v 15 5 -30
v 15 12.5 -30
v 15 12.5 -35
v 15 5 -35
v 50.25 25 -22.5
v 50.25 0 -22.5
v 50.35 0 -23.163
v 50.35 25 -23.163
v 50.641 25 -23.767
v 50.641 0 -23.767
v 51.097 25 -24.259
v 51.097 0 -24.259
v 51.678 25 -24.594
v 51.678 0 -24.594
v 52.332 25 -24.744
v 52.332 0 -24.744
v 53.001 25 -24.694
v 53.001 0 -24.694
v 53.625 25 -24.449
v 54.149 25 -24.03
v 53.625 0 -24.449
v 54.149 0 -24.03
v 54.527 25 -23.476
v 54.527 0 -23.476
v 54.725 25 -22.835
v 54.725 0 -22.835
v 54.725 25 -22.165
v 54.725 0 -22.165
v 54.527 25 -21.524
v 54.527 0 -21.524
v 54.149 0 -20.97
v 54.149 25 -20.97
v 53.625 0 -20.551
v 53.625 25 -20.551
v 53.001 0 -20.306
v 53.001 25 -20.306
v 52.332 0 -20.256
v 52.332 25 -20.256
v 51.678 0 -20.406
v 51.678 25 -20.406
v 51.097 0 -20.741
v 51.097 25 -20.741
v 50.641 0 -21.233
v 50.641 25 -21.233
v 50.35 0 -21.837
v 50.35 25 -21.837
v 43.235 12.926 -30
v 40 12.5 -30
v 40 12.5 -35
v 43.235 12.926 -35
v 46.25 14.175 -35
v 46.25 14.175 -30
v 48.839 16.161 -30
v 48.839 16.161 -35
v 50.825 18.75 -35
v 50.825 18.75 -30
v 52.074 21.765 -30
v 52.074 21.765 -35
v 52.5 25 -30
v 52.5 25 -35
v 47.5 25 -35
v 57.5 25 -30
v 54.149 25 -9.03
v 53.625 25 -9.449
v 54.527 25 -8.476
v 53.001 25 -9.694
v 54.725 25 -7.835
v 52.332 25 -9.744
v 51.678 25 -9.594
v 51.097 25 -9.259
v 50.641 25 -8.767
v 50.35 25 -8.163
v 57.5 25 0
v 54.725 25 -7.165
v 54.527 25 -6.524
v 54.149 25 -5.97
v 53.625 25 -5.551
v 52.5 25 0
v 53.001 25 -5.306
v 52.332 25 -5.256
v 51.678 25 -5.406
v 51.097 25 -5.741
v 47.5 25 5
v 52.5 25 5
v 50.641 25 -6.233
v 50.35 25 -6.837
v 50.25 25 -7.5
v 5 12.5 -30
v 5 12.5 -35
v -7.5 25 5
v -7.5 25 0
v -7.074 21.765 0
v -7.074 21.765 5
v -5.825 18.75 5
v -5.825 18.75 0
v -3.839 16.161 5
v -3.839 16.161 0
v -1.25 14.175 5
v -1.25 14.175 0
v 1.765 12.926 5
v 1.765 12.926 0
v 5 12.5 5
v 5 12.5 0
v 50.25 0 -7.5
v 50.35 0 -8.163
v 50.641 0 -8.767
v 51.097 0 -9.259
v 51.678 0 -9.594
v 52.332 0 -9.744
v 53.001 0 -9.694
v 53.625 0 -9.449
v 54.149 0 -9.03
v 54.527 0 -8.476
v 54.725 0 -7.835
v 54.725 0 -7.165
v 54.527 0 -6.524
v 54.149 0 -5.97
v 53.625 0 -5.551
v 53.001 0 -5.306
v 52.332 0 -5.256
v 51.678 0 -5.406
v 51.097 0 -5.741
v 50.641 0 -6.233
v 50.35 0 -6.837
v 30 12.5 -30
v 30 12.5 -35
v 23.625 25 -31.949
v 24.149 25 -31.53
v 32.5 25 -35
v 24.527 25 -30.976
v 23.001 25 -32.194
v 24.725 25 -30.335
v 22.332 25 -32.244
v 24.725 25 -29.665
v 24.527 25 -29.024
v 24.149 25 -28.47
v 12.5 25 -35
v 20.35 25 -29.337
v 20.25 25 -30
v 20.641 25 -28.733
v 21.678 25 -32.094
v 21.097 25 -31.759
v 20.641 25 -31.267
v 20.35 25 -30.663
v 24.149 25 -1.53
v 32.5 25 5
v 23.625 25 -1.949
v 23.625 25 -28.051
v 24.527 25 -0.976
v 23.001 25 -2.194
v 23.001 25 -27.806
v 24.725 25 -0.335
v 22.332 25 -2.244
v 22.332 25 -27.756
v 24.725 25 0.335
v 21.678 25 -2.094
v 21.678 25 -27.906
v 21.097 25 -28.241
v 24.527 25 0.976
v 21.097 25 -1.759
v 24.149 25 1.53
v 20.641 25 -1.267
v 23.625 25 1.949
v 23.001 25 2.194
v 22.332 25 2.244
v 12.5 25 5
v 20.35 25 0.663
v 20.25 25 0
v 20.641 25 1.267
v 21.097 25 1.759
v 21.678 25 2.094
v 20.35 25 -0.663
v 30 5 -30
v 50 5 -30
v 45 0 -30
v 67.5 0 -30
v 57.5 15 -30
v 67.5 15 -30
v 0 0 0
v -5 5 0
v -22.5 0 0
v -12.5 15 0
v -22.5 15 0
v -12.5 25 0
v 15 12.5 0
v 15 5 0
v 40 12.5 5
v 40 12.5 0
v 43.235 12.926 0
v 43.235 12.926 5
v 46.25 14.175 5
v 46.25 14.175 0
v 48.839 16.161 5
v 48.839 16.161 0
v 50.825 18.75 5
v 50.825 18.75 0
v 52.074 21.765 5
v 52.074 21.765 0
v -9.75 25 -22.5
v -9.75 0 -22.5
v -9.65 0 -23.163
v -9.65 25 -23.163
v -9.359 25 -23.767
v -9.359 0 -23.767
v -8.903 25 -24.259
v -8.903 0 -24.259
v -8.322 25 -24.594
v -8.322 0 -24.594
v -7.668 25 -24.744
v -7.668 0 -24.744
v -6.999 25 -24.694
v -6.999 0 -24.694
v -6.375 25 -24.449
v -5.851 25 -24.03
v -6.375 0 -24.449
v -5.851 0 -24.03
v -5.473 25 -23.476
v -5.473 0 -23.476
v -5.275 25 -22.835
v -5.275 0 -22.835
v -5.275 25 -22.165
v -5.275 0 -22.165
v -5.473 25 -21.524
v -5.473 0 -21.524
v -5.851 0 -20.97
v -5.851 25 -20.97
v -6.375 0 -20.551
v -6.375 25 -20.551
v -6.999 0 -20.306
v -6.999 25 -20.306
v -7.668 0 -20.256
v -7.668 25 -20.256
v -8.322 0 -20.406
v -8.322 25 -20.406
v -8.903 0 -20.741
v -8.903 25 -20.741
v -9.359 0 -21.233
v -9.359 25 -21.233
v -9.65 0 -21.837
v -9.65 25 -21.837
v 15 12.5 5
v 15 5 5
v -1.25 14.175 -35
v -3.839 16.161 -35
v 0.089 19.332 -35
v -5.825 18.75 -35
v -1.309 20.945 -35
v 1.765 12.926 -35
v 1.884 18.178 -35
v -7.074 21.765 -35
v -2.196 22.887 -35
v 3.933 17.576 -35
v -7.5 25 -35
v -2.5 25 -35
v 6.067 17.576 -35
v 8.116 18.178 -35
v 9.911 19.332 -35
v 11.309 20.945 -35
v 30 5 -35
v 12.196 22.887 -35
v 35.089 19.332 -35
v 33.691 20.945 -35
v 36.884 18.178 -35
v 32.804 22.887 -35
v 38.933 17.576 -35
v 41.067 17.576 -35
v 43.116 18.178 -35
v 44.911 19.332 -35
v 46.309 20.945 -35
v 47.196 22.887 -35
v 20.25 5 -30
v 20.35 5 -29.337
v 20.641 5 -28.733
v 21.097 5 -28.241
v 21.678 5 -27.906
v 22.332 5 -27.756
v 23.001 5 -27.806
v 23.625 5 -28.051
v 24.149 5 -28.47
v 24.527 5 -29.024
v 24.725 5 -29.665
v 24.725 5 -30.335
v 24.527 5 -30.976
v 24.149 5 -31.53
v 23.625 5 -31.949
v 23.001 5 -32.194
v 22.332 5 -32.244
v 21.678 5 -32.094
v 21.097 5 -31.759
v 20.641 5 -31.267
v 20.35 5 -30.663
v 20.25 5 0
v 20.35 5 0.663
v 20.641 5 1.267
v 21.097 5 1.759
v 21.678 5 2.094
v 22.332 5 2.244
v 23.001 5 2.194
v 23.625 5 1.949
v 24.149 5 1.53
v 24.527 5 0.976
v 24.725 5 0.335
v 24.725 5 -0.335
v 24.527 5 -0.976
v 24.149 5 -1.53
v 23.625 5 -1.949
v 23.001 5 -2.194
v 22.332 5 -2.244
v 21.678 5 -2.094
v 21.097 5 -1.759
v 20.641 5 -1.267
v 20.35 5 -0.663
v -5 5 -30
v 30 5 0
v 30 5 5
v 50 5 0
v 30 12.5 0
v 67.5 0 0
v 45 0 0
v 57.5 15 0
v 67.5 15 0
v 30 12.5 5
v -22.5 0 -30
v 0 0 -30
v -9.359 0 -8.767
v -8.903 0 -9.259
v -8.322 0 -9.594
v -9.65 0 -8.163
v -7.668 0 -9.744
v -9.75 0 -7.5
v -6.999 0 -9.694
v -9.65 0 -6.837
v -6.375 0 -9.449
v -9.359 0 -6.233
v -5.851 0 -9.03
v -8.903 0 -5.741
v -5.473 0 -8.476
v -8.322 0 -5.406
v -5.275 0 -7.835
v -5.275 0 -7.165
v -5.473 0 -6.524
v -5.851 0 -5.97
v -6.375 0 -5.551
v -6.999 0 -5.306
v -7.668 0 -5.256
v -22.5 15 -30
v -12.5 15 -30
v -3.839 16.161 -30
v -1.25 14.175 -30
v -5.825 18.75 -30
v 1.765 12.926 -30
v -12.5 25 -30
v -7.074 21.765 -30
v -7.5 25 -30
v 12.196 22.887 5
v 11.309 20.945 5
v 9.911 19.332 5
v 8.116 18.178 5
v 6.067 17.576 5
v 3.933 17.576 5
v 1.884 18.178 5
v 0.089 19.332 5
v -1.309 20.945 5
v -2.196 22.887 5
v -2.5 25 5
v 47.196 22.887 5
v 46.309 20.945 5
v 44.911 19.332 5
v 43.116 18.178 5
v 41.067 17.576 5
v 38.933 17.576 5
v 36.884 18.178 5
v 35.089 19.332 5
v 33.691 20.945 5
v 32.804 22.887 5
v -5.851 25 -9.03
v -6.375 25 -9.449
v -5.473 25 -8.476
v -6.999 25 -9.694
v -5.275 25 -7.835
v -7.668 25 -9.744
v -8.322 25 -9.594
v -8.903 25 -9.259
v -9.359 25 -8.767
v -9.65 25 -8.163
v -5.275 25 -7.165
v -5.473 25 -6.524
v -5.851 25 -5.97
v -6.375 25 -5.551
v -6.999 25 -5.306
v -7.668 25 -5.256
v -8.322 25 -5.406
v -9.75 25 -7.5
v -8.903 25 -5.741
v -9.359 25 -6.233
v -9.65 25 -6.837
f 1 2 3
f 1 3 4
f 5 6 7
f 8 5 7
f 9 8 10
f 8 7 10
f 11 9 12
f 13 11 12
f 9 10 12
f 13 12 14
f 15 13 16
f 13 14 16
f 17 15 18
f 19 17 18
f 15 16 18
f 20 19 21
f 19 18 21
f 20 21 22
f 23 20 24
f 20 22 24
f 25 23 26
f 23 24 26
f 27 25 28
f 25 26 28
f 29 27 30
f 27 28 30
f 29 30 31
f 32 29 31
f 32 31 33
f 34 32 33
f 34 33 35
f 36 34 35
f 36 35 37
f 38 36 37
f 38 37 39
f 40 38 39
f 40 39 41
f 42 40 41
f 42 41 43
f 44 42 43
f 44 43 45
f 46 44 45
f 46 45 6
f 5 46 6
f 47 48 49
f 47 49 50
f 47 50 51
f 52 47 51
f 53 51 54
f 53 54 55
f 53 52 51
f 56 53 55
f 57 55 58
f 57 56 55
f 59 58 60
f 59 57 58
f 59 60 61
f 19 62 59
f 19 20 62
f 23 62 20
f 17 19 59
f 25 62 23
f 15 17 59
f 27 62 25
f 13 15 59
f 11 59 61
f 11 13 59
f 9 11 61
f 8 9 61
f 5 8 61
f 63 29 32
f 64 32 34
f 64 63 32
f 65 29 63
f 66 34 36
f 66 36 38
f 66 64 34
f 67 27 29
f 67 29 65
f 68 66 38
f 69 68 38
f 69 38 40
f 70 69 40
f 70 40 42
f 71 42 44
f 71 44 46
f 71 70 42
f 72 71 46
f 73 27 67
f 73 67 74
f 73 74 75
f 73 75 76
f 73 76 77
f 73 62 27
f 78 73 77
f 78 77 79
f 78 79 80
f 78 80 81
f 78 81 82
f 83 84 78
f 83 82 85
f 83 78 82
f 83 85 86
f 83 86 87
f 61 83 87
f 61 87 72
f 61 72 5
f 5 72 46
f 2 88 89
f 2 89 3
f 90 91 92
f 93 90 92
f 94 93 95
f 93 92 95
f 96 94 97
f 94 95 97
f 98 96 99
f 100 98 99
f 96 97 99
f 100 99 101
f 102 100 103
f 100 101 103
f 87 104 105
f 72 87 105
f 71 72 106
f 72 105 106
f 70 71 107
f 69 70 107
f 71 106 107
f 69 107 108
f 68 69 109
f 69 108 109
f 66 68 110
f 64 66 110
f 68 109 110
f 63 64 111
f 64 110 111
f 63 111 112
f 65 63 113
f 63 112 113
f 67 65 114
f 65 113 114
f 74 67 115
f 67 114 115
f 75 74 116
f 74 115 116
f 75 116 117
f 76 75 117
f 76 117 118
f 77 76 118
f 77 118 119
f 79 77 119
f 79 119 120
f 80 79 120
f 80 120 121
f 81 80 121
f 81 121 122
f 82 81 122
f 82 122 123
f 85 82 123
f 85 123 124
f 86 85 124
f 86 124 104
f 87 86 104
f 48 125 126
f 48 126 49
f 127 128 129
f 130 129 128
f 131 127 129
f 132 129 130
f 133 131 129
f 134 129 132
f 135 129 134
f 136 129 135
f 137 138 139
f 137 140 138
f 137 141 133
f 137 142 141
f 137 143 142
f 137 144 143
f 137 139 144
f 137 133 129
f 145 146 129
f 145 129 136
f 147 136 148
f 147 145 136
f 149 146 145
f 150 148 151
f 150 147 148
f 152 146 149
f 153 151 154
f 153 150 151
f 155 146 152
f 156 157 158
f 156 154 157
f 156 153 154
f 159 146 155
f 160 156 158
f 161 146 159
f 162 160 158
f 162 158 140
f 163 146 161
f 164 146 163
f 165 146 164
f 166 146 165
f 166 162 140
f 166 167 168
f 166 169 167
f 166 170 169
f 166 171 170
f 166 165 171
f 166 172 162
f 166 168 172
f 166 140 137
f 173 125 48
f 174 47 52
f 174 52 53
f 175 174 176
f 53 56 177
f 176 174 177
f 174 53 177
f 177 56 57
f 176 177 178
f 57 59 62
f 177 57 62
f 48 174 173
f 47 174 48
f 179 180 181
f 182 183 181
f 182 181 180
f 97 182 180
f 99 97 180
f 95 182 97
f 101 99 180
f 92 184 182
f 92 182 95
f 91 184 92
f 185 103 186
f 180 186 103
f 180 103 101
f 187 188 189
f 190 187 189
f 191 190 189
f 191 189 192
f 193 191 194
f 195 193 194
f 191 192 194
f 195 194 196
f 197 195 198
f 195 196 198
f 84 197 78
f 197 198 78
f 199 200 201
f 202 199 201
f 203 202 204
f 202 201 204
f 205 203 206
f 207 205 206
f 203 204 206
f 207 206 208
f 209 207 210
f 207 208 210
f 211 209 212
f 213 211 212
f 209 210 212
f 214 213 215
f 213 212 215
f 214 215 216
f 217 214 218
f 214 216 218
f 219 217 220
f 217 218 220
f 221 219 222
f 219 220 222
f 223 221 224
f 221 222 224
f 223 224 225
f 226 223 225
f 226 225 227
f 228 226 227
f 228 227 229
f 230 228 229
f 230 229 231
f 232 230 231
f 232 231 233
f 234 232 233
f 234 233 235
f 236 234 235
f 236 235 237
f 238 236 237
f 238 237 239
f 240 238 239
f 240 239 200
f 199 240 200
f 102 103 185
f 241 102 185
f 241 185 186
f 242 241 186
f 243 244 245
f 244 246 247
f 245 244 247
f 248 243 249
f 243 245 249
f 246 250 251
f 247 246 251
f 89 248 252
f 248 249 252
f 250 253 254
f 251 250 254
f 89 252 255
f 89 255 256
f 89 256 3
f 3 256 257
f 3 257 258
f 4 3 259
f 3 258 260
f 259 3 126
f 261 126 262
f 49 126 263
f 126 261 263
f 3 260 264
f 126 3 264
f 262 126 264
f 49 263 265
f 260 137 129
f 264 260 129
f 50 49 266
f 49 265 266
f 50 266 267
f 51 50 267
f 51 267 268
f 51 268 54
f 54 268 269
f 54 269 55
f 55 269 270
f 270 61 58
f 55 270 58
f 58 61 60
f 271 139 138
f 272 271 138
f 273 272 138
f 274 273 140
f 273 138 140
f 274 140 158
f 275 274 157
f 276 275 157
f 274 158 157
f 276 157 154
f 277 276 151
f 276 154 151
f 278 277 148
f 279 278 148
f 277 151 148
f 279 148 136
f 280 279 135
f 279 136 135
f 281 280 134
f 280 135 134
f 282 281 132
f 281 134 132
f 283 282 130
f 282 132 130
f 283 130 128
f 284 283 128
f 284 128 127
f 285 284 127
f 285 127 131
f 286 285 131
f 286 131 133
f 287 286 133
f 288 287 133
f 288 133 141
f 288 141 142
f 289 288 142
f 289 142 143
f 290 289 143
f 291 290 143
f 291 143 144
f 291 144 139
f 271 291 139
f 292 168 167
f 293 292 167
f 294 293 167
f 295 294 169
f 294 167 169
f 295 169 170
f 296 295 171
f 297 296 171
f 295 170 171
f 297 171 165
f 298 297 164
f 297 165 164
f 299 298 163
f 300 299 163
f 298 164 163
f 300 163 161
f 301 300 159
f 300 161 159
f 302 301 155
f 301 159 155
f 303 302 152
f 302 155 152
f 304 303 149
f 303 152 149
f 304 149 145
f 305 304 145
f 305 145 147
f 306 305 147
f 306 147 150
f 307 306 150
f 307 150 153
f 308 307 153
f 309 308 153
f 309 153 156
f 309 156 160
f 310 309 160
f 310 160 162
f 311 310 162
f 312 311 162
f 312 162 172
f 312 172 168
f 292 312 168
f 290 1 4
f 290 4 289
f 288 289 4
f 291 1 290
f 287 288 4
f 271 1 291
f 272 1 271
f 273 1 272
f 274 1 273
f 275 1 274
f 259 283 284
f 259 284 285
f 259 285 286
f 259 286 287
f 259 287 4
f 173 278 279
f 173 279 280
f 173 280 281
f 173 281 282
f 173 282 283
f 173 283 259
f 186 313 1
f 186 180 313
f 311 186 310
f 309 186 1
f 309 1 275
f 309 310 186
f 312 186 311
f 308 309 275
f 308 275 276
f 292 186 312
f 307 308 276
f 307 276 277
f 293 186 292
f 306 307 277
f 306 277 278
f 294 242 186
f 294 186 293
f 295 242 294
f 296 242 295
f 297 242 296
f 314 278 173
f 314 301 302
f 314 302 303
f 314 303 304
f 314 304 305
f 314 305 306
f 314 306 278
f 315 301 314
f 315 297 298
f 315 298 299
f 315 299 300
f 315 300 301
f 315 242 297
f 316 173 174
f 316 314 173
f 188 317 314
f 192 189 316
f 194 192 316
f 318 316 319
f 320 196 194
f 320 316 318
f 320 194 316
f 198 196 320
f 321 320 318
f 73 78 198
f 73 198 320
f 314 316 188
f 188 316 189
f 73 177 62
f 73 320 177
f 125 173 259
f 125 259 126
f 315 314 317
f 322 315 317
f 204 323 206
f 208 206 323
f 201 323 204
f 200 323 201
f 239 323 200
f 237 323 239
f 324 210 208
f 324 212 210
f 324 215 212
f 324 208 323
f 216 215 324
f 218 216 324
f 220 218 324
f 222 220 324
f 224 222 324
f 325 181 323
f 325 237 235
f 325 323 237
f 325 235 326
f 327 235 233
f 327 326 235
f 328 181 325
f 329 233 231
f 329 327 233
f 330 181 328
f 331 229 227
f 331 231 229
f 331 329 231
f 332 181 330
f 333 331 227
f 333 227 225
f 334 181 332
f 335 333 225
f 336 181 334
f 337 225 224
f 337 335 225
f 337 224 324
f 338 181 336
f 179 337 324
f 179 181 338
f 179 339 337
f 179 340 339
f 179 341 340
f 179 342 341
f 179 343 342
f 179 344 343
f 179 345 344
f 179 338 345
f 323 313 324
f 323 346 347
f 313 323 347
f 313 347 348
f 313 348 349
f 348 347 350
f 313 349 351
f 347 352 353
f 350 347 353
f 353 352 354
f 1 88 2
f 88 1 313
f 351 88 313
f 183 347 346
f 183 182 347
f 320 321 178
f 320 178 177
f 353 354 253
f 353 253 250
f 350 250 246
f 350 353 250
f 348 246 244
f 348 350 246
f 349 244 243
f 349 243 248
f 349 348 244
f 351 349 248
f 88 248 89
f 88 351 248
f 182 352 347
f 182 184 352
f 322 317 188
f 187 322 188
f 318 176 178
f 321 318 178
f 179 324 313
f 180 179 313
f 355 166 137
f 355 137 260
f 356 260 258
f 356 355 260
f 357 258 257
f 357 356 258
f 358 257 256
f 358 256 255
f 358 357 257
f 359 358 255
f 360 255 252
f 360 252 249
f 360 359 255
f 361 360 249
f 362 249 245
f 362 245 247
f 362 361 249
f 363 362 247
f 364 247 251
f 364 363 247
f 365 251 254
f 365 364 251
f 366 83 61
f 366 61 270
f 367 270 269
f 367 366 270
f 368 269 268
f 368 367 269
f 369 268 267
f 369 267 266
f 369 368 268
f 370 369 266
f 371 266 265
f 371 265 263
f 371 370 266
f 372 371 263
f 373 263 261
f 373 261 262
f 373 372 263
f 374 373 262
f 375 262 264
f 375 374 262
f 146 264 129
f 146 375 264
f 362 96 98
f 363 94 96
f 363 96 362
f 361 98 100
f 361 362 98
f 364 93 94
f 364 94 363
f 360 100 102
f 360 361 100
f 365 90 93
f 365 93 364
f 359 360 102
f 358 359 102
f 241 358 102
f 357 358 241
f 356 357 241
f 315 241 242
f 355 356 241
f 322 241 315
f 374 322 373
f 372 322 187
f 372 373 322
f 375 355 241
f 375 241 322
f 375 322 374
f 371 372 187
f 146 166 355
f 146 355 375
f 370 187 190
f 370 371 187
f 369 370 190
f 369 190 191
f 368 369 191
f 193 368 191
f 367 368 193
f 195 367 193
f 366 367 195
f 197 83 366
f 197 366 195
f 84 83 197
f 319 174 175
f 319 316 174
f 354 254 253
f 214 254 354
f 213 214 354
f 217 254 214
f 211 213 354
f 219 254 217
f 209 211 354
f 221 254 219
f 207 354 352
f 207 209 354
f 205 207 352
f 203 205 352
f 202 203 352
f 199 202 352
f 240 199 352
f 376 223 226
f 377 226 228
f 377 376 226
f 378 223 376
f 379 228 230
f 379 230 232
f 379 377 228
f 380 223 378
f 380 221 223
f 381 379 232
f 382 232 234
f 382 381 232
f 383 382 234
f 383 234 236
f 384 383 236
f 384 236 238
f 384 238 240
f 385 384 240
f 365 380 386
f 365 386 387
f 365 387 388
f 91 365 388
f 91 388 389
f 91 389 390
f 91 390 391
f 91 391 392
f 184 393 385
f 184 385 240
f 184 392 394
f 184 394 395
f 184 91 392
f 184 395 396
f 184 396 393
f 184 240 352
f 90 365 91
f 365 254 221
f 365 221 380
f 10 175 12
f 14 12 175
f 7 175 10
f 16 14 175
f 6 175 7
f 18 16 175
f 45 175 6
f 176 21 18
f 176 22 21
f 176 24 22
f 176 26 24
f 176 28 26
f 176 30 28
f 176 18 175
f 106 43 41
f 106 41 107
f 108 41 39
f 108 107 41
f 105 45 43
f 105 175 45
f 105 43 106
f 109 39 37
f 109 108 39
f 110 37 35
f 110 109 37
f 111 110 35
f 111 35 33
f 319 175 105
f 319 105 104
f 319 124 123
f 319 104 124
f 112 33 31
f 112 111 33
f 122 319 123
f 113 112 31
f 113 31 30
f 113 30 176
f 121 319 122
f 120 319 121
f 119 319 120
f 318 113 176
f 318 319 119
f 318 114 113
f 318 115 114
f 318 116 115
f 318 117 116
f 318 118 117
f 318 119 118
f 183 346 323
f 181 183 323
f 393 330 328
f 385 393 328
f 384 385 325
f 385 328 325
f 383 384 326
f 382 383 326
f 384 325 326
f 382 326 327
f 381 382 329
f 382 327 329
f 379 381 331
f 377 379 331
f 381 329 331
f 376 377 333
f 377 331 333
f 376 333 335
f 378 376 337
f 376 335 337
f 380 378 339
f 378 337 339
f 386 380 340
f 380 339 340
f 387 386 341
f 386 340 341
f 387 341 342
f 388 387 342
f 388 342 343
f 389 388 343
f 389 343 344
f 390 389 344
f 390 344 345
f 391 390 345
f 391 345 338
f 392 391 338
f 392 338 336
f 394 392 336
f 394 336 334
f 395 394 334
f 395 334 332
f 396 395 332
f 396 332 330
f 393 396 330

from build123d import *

# Parameters (mm, degrees)
BOSS_EXTRUDE1_DEPTH   = 5
BOSS_EXTRUDE2_START   = -15
BOSS_EXTRUDE2_DEPTH   = 15
F_1_0MM_DOWEL_HOLE1_D = 4.5
SKETCH5_R             = 2.25
CUT_EXTRUDE1_DEPTH    = 81.039052968


with BuildPart() as part:
    # Sketch1 → Boss-Extrude1 (new body)
    with BuildSketch(Plane.XY):
        with BuildLine():
            Line((22.5, 25), (22.5, 5))
            Line((22.5, 5), (30, 5))
            Line((30, 5), (30, 12.5))
            Line((30, 12.5), (40, 12.5))
            ThreePointArc((40, 12.5), (48.838834765, 16.161165235), (52.5, 25))
            Line((52.5, 25), (47.5, 25))
            ThreePointArc((47.5, 25), (40, 17.5), (32.5, 25))
            Line((32.5, 25), (22.5, 25))
        make_face()
        with BuildLine():
            Line((15, 12.5), (15, 5))
            Line((15, 5), (22.5, 5))
            Line((22.5, 5), (22.5, 25))
            Line((22.5, 25), (12.5, 25))
            ThreePointArc((12.5, 25), (5, 17.5), (-2.5, 25))
            Line((-2.5, 25), (-7.5, 25))
            ThreePointArc((-7.5, 25), (-3.838834765, 16.161165235), (5, 12.5))
            Line((5, 12.5), (15, 12.5))
        make_face()
    extrude(amount=BOSS_EXTRUDE1_DEPTH)

    # Sketch1<3> → Boss-Extrude2 (add)
    with BuildSketch(Plane.XY.offset(BOSS_EXTRUDE2_START)):
        with BuildLine():
            Line((30, 12.5), (30, 5))
            Line((30, 5), (50, 5))
            Line((50, 5), (45, 0))
            Line((45, 0), (67.5, 0))
            Line((67.5, 0), (67.5, 15))
            Line((67.5, 15), (57.5, 15))
            Line((57.5, 15), (57.5, 25))
            Line((57.5, 25), (52.5, 25))
            ThreePointArc((52.5, 25), (48.838834765, 16.161165235), (40, 12.5))
            Line((40, 12.5), (30, 12.5))
        make_face()
        with BuildLine():
            Line((-22.5, 0), (0, 0))
            Line((0, 0), (-5, 5))
            Line((-5, 5), (15, 5))
            Line((15, 5), (15, 12.5))
            Line((15, 12.5), (5, 12.5))
            ThreePointArc((5, 12.5), (-3.838834765, 16.161165235), (-7.5, 25))
            Line((-7.5, 25), (-12.5, 25))
            Line((-12.5, 25), (-12.5, 15))
            Line((-12.5, 15), (-22.5, 15))
            Line((-22.5, 15), (-22.5, 0))
        make_face()
        with BuildLine():
            Line((15, 12.5), (15, 5))
            Line((15, 5), (22.5, 5))
            Line((22.5, 5), (22.5, 25))
            Line((22.5, 25), (12.5, 25))
            ThreePointArc((12.5, 25), (5, 17.5), (-2.5, 25))
            Line((-2.5, 25), (-7.5, 25))
            ThreePointArc((-7.5, 25), (-3.838834765, 16.161165235), (5, 12.5))
            Line((5, 12.5), (15, 12.5))
        make_face()
        with BuildLine():
            Line((22.5, 25), (22.5, 5))
            Line((22.5, 5), (30, 5))
            Line((30, 5), (30, 12.5))
            Line((30, 12.5), (40, 12.5))
            ThreePointArc((40, 12.5), (48.838834765, 16.161165235), (52.5, 25))
            Line((52.5, 25), (47.5, 25))
            ThreePointArc((47.5, 25), (40, 17.5), (32.5, 25))
            Line((32.5, 25), (22.5, 25))
        make_face()
    extrude(amount=BOSS_EXTRUDE2_DEPTH)

    # Mirror1: part across plane


with BuildPart() as part_1:
    add(part.part)
    add(part.part.mirror(Plane(origin=(0, 0, -15), x_dir=(1, 0, 0), z_dir=(0, 0, -1))))

    # Ø1.0mm Dowel Hole1 (through all)
    with Locations(Plane(origin=(-7.5, 25, -7.5), x_dir=(1, 0, 0), z_dir=(0, 1, 0))):
        with Locations((0, 0), (60, 15), (60, 0), (0, 15)):
            Hole(F_1_0MM_DOWEL_HOLE1_D / 2)

    # Sketch5 → Cut-Extrude1 (cut, through all)
    with BuildSketch(Plane(origin=(0, 25, 0), x_dir=(1, 0, 0), z_dir=(0, 1, 0))):
        with Locations(Location((22.5, 30, 0), (0, 0, 180))):
            Circle(SKETCH5_R)
        with Locations(Location((22.5, 0, 0), (0, 0, 180))):
            Circle(SKETCH5_R)
    extrude(amount=-CUT_EXTRUDE1_DEPTH, mode=Mode.SUBTRACT)


solid = part_1.part
